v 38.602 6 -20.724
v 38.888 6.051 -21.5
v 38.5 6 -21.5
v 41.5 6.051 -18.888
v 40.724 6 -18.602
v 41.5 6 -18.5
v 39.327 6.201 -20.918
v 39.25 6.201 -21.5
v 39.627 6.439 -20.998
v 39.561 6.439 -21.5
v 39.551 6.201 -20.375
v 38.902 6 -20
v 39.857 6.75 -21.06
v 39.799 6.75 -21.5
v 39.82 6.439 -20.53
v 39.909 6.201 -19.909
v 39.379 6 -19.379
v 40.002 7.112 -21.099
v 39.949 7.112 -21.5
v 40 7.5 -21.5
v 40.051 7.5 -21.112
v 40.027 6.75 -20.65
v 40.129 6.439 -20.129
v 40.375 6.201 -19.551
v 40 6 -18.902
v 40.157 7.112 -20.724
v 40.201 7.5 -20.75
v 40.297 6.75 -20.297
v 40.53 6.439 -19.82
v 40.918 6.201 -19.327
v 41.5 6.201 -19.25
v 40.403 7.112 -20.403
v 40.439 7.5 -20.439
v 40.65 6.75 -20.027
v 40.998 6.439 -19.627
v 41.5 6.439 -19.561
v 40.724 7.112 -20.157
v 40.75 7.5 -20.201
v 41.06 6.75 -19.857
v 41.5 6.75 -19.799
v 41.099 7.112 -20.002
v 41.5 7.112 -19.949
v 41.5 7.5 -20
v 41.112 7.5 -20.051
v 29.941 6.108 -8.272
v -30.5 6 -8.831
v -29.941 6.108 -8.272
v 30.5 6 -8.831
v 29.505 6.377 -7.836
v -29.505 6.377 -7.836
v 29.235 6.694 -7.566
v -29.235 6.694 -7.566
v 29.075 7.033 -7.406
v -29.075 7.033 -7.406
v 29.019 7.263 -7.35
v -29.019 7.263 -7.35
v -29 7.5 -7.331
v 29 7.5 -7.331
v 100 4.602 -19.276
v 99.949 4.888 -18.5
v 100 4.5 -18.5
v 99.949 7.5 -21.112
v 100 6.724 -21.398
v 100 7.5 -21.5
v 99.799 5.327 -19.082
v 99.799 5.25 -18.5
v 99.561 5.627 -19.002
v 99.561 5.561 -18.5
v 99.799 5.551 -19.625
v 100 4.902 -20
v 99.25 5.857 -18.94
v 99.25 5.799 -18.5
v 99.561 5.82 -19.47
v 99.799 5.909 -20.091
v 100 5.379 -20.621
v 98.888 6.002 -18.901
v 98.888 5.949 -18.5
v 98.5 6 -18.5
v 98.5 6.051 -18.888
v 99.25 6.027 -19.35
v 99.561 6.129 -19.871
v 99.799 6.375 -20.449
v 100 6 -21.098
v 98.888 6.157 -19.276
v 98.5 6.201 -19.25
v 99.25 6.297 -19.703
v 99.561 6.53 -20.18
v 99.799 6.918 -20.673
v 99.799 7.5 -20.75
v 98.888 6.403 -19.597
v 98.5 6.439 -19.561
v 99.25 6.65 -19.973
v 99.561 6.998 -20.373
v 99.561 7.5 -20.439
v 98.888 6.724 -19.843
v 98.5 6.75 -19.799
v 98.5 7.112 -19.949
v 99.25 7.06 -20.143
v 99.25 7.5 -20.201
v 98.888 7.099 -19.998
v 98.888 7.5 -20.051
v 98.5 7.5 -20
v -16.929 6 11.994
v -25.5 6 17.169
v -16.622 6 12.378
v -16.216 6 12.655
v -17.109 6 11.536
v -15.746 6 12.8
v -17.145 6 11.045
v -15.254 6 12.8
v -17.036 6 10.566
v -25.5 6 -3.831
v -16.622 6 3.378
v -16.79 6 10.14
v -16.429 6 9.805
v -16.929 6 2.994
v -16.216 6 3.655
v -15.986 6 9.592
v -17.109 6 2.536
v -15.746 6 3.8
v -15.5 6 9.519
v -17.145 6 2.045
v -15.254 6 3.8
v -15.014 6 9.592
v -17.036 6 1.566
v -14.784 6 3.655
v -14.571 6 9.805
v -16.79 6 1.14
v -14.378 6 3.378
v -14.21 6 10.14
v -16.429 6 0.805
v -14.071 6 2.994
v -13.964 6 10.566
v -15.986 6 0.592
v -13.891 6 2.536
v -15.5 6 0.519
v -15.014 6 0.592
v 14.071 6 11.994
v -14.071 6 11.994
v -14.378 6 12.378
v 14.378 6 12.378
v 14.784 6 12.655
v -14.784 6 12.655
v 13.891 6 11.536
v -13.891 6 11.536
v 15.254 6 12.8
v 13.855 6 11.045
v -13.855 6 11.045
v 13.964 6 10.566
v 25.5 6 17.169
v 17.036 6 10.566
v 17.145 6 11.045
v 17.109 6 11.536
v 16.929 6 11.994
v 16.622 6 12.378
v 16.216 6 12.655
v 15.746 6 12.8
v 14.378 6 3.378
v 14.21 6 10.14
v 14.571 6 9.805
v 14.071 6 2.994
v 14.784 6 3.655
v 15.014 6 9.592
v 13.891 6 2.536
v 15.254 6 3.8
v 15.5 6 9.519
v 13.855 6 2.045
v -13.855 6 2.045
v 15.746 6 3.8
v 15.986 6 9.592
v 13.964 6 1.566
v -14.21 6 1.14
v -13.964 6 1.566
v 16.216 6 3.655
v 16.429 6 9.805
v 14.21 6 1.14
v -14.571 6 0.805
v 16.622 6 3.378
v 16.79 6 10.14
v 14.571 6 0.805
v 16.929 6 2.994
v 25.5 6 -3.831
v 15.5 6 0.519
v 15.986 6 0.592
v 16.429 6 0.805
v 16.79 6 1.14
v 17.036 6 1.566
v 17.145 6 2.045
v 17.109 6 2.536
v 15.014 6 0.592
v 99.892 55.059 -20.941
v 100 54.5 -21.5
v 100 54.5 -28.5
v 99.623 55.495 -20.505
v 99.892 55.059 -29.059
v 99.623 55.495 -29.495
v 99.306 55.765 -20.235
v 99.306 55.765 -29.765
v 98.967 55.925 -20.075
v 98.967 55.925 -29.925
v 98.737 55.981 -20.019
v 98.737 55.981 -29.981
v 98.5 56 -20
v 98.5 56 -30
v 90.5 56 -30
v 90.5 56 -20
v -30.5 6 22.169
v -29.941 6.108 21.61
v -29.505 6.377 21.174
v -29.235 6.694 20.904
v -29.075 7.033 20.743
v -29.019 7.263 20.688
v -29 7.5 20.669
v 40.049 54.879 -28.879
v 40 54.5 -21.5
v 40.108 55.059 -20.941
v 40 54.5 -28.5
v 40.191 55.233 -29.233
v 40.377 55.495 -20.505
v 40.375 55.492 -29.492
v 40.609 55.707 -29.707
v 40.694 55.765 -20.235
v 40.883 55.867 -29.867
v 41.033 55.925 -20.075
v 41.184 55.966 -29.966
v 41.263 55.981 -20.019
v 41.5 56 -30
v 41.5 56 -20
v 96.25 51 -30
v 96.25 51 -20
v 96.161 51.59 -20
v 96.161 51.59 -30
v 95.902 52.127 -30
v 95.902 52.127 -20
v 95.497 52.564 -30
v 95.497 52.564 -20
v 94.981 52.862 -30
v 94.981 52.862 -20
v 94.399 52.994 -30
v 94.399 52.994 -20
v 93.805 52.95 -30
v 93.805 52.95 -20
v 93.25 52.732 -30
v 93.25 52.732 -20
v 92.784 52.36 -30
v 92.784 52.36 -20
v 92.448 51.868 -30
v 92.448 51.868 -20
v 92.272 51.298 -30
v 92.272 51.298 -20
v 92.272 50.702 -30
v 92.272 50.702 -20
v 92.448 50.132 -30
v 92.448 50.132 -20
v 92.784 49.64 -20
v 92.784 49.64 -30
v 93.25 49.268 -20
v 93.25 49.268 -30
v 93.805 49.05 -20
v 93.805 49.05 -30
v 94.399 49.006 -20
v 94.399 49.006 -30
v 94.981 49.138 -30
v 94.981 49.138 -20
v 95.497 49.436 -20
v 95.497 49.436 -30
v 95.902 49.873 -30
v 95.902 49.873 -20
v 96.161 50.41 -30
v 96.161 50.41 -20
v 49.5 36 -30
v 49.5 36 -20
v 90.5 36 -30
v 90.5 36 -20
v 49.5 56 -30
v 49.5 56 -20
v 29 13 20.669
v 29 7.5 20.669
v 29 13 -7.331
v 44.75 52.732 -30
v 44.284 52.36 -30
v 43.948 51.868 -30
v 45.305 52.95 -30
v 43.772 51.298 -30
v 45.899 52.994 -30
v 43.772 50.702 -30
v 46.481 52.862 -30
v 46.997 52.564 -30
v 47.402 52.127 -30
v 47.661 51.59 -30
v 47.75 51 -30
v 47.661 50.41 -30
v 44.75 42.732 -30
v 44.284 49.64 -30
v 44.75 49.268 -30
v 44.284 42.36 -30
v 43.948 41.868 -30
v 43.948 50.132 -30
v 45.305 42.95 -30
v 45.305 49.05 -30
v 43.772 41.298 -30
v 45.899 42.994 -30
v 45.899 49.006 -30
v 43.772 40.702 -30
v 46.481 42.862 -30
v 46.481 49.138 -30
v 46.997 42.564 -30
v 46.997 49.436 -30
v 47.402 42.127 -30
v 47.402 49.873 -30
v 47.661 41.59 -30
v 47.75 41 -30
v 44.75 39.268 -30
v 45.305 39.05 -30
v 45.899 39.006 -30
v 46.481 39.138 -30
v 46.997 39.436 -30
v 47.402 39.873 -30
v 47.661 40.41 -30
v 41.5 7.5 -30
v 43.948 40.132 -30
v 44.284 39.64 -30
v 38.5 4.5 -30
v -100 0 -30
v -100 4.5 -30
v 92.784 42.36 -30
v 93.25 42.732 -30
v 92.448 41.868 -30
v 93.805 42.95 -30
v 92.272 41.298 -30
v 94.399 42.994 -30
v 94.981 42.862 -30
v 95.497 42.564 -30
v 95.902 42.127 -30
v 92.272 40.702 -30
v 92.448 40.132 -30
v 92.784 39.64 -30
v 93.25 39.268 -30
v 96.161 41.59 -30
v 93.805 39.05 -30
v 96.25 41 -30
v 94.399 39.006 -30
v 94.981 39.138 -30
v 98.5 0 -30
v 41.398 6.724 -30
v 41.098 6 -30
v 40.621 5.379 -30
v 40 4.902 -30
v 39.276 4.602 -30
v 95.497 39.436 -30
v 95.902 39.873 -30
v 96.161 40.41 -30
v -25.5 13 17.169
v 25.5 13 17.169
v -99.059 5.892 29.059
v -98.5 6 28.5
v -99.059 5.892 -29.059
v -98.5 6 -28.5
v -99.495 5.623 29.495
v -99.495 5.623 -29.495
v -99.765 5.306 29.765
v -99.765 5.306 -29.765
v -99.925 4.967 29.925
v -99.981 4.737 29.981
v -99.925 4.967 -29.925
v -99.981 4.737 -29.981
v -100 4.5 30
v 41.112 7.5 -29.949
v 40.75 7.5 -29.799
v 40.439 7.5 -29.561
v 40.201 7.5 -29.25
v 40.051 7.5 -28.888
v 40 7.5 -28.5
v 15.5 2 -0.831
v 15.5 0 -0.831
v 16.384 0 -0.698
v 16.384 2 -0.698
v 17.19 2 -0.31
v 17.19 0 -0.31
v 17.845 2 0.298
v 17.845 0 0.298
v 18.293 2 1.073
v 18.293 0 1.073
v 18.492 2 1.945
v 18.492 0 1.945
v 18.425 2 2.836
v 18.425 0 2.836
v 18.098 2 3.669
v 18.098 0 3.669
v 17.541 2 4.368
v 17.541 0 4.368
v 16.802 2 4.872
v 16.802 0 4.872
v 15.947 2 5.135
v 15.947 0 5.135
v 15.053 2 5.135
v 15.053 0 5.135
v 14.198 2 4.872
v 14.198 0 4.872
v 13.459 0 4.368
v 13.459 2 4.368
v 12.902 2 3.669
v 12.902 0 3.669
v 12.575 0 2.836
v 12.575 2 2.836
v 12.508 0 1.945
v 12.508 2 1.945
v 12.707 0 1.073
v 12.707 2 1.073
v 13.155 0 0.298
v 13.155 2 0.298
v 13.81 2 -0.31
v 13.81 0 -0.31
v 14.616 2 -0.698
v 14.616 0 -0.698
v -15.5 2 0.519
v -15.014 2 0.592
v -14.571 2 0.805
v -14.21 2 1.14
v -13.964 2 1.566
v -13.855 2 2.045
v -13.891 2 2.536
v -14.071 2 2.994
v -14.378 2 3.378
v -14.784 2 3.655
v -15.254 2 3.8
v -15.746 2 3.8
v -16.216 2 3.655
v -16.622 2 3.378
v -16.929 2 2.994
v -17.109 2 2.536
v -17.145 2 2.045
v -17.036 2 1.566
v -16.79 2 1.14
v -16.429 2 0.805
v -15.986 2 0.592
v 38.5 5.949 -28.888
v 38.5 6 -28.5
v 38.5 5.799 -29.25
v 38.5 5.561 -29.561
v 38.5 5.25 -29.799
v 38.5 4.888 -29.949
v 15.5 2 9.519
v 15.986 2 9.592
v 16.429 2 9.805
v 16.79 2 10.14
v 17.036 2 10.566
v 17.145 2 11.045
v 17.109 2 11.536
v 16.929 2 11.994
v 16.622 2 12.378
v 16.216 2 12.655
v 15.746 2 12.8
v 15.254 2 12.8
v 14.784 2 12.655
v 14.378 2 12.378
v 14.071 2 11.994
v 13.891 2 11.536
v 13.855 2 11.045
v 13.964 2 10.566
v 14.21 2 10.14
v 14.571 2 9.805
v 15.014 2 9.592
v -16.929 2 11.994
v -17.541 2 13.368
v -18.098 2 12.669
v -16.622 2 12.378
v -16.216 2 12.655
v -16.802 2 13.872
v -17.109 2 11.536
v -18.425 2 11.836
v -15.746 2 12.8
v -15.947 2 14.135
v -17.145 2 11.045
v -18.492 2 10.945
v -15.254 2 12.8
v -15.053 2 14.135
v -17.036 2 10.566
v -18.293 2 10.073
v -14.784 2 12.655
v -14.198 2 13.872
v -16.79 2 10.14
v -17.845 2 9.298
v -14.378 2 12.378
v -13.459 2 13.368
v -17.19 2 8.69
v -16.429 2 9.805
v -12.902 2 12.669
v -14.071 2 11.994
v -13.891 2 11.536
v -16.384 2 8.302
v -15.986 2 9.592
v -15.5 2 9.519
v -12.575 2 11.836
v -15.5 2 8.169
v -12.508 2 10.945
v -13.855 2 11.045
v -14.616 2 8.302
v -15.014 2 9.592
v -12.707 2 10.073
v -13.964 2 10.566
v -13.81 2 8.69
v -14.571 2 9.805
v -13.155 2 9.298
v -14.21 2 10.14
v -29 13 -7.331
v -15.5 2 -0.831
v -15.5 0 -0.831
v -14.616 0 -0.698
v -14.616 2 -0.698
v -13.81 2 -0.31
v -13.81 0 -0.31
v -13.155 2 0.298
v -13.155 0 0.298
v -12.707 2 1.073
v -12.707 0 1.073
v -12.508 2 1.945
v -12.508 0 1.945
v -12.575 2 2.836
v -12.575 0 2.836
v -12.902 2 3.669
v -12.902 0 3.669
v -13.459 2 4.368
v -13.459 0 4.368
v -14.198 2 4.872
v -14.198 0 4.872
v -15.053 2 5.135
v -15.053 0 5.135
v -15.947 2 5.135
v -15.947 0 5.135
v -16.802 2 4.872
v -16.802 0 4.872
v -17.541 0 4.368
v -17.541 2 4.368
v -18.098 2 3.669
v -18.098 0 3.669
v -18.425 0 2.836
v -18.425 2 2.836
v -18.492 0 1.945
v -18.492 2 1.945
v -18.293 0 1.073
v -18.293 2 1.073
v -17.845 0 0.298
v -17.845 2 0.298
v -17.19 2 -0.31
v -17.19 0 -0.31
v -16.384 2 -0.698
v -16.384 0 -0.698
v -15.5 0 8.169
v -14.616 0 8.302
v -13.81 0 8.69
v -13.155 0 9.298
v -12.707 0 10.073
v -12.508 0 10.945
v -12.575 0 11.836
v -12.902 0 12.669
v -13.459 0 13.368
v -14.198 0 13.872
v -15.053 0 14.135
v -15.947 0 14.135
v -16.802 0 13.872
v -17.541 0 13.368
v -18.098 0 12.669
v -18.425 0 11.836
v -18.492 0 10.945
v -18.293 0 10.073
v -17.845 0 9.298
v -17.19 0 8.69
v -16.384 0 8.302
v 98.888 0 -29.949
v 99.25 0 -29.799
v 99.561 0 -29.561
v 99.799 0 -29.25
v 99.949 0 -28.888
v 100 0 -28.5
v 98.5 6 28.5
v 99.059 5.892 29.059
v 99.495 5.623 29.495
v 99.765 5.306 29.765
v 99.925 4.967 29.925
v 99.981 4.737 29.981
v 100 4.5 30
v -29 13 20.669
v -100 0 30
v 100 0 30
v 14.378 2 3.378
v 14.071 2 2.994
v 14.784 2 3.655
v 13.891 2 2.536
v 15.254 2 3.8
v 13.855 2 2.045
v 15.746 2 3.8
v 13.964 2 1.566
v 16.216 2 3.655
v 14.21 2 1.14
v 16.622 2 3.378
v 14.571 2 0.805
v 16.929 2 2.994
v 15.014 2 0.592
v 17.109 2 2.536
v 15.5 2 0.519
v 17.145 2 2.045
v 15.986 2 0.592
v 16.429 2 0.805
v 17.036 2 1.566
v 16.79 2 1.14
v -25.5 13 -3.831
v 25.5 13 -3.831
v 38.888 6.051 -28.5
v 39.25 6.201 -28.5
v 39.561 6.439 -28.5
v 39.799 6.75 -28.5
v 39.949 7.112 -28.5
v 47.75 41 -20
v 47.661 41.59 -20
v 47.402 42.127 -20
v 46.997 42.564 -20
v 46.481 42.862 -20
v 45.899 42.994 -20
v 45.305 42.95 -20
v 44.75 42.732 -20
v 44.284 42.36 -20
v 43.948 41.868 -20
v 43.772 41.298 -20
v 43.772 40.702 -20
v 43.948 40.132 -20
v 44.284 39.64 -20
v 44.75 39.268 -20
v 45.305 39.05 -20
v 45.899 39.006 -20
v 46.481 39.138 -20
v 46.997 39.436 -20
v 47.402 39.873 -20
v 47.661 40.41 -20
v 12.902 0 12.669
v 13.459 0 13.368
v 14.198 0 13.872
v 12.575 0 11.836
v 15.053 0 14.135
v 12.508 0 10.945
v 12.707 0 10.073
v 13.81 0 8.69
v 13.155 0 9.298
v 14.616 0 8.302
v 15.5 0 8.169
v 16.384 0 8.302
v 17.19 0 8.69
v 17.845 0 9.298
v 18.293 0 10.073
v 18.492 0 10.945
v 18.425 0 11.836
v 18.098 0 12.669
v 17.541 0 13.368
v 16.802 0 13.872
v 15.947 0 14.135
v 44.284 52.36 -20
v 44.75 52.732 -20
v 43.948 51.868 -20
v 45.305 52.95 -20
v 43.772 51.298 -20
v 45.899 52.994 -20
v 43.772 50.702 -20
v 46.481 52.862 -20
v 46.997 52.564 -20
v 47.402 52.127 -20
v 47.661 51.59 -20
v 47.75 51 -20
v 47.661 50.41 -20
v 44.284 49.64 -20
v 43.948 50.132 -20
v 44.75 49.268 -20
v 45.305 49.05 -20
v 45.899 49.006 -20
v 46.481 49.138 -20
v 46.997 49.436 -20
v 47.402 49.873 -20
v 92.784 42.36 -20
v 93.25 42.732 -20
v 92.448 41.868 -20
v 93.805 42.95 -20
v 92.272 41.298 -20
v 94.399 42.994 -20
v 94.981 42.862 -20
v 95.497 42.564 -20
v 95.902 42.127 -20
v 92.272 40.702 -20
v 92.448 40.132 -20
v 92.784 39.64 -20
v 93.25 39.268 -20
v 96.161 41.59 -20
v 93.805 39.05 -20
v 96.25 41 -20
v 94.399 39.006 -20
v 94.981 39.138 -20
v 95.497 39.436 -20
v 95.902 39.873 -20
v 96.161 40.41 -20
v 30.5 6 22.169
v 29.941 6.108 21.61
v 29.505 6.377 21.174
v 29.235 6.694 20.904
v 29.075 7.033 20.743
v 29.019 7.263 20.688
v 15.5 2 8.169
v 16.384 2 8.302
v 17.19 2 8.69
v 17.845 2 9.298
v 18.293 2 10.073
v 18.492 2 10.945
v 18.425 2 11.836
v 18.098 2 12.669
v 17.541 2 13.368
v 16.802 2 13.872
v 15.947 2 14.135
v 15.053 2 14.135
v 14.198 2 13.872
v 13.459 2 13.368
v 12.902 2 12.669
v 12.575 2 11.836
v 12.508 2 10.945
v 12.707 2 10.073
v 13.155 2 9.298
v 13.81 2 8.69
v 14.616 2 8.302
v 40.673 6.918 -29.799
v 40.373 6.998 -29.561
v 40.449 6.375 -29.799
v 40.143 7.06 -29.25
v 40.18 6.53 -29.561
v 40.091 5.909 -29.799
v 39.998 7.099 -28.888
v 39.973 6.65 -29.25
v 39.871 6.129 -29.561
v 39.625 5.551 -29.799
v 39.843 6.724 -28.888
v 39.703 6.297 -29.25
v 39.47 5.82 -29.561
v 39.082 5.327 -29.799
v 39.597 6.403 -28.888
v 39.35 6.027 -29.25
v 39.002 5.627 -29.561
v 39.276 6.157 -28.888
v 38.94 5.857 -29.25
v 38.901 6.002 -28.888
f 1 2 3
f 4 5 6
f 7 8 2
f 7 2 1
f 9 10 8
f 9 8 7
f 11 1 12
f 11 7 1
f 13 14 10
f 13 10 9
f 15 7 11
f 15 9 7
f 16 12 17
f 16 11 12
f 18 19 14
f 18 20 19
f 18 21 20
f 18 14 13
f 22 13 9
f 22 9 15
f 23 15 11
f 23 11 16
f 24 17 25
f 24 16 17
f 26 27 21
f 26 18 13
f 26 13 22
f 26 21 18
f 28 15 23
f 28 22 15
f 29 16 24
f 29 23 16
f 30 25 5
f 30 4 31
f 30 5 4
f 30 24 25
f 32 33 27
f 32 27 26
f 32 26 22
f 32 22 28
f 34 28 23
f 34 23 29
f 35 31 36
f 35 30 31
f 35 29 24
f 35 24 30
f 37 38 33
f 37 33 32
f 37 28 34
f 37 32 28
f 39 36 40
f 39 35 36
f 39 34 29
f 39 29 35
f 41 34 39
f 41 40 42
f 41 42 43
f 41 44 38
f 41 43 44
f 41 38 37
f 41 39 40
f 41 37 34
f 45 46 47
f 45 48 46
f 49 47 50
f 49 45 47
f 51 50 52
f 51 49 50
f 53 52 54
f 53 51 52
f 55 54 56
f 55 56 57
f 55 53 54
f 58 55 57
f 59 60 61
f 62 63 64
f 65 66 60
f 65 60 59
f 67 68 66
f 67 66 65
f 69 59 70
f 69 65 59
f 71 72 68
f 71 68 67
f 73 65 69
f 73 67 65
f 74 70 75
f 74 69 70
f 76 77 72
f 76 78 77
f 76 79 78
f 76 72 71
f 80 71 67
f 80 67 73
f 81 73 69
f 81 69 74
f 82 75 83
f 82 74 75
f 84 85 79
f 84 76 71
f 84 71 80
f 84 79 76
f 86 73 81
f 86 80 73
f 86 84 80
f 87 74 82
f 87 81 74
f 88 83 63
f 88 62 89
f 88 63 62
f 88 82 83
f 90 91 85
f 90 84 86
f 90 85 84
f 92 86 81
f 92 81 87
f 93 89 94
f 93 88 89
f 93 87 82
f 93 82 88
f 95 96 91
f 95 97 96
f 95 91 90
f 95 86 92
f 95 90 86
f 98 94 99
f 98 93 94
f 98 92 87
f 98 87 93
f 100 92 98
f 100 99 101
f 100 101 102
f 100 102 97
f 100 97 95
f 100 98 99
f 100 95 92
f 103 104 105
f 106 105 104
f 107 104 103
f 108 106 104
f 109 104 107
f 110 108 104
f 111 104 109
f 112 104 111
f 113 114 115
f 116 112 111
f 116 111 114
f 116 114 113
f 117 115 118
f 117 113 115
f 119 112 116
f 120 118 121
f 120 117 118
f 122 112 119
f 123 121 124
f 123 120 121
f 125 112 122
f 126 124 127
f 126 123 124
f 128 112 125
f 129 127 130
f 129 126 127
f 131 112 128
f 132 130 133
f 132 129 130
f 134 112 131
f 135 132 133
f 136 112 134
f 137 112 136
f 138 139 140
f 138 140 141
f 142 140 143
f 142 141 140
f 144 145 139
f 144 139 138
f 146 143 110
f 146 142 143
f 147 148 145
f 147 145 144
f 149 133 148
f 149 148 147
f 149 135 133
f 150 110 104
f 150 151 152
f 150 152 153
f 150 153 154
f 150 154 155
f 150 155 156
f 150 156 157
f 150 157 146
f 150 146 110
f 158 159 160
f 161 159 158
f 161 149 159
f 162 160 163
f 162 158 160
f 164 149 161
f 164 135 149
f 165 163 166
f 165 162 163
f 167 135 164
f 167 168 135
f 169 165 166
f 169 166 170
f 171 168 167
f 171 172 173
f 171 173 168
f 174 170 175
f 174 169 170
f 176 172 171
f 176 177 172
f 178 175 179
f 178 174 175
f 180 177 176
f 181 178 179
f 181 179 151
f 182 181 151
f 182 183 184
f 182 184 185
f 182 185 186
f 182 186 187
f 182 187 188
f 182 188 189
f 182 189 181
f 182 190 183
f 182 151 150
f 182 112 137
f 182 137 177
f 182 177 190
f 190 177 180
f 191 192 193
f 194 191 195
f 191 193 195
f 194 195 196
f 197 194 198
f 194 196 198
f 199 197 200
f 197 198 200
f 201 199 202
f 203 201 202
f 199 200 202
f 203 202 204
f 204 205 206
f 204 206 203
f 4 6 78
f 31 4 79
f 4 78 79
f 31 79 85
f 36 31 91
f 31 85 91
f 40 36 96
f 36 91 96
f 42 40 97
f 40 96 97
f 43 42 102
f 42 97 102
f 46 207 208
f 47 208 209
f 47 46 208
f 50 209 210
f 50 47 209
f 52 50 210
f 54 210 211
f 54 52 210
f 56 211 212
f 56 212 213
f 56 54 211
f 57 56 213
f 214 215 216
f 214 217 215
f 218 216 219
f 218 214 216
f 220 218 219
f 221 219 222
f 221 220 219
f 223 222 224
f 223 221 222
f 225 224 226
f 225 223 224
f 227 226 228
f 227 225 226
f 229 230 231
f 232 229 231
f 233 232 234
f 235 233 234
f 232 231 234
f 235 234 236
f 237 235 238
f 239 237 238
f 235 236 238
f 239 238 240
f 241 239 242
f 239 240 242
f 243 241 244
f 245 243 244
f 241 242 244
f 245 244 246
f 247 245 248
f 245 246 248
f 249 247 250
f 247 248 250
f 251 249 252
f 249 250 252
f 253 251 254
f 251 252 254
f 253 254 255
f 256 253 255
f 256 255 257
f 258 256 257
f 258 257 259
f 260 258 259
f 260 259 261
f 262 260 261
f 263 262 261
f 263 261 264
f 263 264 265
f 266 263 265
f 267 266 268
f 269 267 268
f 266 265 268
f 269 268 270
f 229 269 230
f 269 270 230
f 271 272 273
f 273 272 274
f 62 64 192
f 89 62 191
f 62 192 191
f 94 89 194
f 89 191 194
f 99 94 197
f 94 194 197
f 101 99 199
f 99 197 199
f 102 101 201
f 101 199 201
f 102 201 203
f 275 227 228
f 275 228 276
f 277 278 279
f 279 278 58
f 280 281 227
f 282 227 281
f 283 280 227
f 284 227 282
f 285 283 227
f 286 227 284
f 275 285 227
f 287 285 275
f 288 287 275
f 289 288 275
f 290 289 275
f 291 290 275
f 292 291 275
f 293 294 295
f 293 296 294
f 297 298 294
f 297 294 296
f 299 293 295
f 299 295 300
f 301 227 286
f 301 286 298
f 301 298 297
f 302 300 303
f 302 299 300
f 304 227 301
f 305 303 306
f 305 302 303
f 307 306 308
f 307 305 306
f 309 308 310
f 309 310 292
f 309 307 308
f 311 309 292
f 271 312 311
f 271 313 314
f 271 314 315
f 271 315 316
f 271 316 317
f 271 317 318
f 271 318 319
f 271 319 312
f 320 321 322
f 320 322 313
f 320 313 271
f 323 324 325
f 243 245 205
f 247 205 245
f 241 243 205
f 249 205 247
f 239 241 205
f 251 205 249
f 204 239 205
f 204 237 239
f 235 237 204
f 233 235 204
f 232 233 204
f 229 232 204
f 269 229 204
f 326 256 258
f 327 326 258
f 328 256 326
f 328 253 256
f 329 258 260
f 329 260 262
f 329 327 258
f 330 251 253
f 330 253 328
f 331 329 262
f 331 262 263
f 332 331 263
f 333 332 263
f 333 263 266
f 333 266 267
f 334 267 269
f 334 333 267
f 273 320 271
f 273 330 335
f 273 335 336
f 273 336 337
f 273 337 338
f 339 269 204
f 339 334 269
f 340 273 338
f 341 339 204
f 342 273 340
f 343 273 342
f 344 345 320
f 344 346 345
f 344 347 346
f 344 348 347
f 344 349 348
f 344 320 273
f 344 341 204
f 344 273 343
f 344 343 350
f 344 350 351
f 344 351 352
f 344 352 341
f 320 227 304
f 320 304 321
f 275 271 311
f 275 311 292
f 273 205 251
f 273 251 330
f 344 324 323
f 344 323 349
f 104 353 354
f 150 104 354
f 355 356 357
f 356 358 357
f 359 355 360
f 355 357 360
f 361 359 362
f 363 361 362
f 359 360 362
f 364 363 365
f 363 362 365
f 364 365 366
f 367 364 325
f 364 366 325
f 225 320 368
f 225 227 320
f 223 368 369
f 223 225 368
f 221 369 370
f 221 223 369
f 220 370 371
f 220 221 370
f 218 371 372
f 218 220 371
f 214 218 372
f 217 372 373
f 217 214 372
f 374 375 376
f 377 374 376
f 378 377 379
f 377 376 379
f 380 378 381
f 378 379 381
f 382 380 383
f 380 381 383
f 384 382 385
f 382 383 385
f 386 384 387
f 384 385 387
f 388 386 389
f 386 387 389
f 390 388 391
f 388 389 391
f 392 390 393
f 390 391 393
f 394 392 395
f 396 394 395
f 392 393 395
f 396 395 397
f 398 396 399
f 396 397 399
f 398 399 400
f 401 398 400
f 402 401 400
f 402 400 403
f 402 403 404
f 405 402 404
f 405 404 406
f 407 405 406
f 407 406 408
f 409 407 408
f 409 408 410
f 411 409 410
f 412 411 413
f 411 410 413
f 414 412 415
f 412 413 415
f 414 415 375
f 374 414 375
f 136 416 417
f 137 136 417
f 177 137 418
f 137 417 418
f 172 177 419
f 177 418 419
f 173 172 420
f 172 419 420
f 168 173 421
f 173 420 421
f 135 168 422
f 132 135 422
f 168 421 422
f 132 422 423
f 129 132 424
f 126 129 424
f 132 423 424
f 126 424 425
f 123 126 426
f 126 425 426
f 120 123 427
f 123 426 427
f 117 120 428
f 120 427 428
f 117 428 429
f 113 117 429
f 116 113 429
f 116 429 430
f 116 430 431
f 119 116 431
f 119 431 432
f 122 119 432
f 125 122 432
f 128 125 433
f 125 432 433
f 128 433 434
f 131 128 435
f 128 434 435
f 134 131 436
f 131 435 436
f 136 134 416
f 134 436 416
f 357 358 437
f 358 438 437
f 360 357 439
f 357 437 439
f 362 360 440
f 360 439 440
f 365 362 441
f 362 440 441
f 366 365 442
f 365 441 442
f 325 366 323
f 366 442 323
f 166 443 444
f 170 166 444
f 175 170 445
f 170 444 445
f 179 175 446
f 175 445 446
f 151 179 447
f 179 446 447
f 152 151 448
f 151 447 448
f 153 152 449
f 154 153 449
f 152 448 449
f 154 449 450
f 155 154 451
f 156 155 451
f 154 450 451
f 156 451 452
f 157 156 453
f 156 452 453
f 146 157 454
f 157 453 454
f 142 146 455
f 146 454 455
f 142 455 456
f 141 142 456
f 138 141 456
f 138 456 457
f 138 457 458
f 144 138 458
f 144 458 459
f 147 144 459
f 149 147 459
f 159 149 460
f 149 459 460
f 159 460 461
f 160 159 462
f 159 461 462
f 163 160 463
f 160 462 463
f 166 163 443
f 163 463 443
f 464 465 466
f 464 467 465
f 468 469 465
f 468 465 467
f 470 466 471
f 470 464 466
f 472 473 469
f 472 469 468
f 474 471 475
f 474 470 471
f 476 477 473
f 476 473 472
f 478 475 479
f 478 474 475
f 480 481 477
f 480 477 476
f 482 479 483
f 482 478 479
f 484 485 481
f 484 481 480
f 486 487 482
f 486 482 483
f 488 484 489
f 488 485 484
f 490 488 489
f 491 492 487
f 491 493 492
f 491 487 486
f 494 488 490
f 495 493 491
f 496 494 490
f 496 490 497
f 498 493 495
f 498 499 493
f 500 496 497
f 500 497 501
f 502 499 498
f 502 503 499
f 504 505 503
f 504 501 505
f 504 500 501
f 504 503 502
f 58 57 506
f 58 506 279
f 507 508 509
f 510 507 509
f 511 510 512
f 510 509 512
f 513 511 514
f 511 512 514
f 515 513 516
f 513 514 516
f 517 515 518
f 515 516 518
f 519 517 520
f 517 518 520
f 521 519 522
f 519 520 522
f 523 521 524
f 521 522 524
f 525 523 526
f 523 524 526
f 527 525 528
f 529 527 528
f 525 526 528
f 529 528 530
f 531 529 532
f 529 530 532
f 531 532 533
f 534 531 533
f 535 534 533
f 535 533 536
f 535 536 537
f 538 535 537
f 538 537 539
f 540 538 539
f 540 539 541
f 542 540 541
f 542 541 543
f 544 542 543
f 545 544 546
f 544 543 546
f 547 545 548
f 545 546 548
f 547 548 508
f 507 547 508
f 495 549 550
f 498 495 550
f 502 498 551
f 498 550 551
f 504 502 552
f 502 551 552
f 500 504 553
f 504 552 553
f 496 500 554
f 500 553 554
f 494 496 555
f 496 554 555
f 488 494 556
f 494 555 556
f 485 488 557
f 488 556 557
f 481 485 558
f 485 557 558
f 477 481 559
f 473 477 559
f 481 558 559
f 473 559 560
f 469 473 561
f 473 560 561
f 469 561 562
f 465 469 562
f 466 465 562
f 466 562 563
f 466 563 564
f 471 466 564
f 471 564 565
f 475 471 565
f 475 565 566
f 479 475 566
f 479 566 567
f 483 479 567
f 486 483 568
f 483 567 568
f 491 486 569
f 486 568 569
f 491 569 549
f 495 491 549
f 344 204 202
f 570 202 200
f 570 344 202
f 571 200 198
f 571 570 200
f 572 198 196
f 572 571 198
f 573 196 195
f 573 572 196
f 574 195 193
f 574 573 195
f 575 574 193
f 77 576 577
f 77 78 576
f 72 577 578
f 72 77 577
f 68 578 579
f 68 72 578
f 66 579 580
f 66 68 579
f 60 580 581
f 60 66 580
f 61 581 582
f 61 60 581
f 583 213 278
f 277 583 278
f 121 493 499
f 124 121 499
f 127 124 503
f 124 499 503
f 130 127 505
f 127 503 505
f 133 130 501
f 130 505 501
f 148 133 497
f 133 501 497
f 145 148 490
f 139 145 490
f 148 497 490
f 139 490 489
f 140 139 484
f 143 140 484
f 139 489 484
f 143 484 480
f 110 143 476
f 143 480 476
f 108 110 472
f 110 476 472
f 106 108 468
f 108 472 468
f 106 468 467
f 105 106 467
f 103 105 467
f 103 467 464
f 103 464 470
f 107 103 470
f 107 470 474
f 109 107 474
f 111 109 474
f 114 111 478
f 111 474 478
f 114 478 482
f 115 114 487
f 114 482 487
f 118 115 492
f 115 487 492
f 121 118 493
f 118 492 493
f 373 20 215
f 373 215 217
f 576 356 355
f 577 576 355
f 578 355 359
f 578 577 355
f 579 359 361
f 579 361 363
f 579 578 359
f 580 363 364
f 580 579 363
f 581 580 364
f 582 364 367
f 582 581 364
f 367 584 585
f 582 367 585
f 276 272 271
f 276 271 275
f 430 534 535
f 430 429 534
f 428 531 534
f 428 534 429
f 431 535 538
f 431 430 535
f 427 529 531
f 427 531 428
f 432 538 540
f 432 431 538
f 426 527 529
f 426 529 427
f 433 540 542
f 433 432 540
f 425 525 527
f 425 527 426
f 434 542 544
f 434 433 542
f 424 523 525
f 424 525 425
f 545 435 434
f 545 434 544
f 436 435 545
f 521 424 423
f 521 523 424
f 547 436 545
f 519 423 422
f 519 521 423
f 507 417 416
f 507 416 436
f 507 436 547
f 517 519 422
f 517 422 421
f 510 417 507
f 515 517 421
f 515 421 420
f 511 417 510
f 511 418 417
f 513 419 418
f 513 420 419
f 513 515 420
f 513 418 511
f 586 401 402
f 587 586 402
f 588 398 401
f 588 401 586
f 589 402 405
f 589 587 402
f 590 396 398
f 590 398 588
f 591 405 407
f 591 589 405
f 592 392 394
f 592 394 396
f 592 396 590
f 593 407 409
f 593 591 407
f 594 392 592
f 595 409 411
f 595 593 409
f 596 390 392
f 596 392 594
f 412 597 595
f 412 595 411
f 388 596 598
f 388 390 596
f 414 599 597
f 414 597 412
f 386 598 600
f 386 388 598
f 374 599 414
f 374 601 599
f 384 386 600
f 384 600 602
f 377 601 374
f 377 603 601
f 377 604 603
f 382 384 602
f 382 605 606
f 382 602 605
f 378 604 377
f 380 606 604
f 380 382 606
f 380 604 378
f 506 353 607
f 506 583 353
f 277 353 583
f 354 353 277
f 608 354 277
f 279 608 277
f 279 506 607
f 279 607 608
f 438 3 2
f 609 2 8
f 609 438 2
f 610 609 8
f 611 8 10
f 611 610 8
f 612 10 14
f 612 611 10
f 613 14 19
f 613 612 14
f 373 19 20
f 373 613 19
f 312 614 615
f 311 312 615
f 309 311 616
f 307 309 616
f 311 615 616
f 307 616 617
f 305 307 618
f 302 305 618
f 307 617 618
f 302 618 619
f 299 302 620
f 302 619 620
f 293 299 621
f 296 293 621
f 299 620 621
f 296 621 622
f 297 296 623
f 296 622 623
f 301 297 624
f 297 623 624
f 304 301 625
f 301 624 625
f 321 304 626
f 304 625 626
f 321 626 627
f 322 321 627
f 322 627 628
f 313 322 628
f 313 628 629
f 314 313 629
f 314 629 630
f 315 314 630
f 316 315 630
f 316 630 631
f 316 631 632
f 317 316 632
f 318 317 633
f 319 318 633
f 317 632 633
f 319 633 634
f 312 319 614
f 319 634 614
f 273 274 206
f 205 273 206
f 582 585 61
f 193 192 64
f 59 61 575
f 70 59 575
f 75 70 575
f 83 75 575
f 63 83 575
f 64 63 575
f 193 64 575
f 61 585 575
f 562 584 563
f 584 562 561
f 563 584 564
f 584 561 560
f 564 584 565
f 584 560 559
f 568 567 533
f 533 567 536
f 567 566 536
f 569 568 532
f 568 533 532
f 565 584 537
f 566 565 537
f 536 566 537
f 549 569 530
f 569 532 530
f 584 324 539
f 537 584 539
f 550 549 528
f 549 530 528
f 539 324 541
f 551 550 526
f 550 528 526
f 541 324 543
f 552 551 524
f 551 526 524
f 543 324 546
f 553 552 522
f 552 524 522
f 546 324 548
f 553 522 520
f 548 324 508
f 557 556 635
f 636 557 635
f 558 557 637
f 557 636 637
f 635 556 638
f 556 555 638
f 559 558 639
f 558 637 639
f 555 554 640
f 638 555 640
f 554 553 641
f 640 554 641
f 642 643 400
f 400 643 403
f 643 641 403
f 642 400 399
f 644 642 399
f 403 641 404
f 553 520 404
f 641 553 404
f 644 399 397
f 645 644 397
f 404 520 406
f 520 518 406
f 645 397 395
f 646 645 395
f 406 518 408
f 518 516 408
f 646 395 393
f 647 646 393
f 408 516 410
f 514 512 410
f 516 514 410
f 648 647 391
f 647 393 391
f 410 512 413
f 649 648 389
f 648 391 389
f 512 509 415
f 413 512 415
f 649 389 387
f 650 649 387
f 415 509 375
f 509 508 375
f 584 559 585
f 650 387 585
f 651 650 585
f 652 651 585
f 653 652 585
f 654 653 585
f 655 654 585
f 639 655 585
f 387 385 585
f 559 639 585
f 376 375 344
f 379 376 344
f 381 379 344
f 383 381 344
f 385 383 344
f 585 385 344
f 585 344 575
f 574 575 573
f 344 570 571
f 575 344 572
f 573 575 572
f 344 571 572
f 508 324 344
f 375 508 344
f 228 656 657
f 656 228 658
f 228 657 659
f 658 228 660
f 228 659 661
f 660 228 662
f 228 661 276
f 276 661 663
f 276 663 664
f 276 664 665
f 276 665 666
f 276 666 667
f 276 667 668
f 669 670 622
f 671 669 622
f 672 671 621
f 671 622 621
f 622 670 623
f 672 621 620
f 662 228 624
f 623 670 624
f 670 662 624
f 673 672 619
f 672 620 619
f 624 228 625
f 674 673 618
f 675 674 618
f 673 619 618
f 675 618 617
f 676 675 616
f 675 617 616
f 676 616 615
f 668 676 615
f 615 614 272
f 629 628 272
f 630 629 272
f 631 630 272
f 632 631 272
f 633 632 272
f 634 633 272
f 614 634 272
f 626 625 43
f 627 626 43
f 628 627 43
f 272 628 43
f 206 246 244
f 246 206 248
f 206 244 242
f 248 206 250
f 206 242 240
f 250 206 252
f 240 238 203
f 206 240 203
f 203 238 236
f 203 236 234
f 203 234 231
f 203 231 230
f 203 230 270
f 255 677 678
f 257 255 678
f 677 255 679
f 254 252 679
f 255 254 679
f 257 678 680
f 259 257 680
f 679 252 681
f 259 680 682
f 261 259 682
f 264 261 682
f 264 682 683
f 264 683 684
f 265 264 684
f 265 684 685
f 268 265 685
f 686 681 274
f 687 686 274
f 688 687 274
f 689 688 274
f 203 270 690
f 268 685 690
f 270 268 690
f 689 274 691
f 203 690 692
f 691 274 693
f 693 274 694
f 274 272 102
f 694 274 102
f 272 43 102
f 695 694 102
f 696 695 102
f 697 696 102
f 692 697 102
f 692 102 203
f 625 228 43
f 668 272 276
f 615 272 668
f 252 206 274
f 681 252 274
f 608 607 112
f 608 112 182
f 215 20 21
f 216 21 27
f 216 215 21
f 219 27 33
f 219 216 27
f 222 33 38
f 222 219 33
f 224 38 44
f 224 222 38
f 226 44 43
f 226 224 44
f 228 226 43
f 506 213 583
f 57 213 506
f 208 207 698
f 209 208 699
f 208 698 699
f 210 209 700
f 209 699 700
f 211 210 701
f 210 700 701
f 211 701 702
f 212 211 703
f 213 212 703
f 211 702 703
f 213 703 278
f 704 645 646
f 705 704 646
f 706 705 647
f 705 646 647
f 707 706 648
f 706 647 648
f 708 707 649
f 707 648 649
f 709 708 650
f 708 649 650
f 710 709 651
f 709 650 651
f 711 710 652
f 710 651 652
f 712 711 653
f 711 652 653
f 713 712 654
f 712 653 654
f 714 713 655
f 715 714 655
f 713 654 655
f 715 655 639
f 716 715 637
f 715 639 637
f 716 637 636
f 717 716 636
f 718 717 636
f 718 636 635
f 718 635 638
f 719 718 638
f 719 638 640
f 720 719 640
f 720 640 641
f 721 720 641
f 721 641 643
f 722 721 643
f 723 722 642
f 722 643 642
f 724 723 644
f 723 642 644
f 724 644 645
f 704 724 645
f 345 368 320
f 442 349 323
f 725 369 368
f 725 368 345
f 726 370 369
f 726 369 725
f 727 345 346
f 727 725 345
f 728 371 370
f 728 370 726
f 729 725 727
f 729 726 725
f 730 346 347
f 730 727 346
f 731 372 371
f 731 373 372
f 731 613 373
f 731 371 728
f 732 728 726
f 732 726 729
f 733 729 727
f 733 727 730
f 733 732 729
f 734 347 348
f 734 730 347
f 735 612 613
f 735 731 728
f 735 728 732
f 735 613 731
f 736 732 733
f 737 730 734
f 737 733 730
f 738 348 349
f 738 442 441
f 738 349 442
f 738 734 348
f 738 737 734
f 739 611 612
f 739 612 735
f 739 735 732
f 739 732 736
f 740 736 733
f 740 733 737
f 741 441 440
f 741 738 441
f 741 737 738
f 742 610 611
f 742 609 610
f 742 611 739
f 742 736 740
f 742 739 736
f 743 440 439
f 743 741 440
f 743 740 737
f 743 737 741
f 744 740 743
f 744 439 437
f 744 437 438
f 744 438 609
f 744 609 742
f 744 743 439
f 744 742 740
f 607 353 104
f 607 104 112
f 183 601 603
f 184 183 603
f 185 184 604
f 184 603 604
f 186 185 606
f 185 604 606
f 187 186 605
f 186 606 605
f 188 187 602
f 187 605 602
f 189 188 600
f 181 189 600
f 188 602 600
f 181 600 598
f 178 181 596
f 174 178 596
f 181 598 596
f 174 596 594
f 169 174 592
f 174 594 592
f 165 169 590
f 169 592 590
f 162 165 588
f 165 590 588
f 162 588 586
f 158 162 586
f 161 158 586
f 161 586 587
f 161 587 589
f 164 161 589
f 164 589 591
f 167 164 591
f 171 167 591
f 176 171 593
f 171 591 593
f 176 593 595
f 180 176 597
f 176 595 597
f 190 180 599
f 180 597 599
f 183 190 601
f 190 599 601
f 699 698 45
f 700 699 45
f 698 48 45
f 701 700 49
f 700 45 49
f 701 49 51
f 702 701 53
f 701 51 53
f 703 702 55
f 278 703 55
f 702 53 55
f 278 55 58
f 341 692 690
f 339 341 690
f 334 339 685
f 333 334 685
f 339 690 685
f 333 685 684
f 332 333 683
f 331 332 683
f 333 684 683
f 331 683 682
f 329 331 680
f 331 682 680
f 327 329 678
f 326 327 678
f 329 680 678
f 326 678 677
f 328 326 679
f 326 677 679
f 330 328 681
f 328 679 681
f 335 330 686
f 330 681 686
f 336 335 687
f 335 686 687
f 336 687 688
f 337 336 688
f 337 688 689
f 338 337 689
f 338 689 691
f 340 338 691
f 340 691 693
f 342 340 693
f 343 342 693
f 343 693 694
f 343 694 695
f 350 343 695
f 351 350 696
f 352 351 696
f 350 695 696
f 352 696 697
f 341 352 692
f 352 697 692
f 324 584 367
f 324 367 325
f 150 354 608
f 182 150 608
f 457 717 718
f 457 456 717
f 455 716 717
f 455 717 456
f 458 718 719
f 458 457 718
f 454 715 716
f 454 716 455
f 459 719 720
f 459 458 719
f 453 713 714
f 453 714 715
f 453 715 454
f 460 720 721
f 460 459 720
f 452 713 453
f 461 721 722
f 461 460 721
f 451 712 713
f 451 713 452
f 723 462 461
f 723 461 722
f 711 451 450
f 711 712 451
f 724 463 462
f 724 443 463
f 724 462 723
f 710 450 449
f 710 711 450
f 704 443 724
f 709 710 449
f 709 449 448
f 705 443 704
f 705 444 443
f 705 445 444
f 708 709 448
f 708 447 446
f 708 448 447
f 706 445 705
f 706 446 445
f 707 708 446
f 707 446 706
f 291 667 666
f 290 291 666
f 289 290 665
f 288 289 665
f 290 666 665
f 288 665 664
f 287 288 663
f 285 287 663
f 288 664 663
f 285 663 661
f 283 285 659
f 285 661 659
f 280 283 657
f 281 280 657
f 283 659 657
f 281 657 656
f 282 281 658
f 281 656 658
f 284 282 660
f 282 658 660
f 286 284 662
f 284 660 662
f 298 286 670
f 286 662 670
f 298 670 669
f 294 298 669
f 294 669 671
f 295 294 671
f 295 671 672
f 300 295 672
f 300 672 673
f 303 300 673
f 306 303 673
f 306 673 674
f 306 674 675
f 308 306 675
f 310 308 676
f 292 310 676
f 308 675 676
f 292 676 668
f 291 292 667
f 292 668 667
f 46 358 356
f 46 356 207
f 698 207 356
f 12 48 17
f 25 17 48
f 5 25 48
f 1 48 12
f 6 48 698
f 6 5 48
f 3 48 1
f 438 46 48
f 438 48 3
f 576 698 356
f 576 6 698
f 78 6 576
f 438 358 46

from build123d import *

# Parameters (mm, degrees)
SKETCH8_W           = 200
SKETCH8_H           = 60
BOSS_EXTRUDE6_DEPTH = 6
SKETCH9_W           = 60
SKETCH9_H           = 10
BOSS_EXTRUDE7_DEPTH = 50
SKETCH10_R          = 2
SKETCH10_W          = 41
SKETCH10_H          = 20
CUT_EXTRUDE8_DEPTH  = 10
SKETCH15_W          = 58
SKETCH15_H          = 28
BOSS_EXTRUDE9_DEPTH = 7
SKETCH12_W          = 51
SKETCH12_H          = 21
CUT_EXTRUDE9_DEPTH  = 7
SKETCH13_R          = 3
CUT_EXTRUDE10_DEPTH = 2
SKETCH17_R          = 1.65
CUT_EXTRUDE11_DEPTH = 4
FILLET1_R           = 1.5
FILLET2_R           = 1.5


with BuildPart() as part:
    # Sketch8 → Boss-Extrude6 (new body)
    with BuildSketch(Plane(origin=(0, 0, 0), x_dir=(1, 0, 0), z_dir=(0, 1, 0))):
        Rectangle(SKETCH8_W, SKETCH8_H)
    extrude(amount=BOSS_EXTRUDE6_DEPTH)

    # Sketch9 → Boss-Extrude7 (add)
    with BuildSketch(Plane(origin=(0, 6, 0), x_dir=(1, 0, 0), z_dir=(0, 1, 0))):
        with Locations((70, 25)):
            Rectangle(SKETCH9_W, SKETCH9_H)
    extrude(amount=BOSS_EXTRUDE7_DEPTH)

    # Sketch10 → Cut-Extrude8 (cut)
    with BuildSketch(Plane.XY.offset(-20)):
        with Locations((45.75, 51)):
            Circle(SKETCH10_R)
        with Locations((45.75, 41)):
            Circle(SKETCH10_R)
        with Locations((70, 46)):
            Rectangle(SKETCH10_W, SKETCH10_H)
        with Locations((94.25, 51)):
            Circle(SKETCH10_R)
        with Locations((94.25, 41)):
            Circle(SKETCH10_R)
    extrude(amount=-CUT_EXTRUDE8_DEPTH, mode=Mode.SUBTRACT)

    # Sketch15 → Boss-Extrude9 (add)
    with BuildSketch(Plane(origin=(0, 6, 0), x_dir=(1, 0, 0), z_dir=(0, 1, 0))):
        with Locations((0, -6.66875)):
            Rectangle(SKETCH15_W, SKETCH15_H)
    extrude(amount=BOSS_EXTRUDE9_DEPTH)

    # Sketch12 → Cut-Extrude9 (cut)
    with BuildSketch(Plane(origin=(0, 13, 0), x_dir=(1, 0, 0), z_dir=(0, 1, 0))):
        with Locations((0, -6.66875)):
            Rectangle(SKETCH12_W, SKETCH12_H)
    extrude(amount=-CUT_EXTRUDE9_DEPTH, mode=Mode.SUBTRACT)

    # Sketch13 → Cut-Extrude10 (cut)
    with BuildSketch(Plane(origin=(0, 0, 0), x_dir=(-1, 0, 0), z_dir=(0, -1, 0))):
        with Locations(Location((-15.5, -2.16875, 0), (0, 0, 90))):
            Circle(SKETCH13_R)
        with Locations(Location((-15.5, -11.16875, 0), (0, 0, 90))):
            Circle(SKETCH13_R)
        with Locations(Location((15.5, -2.16875, 0), (0, 0, 90))):
            Circle(SKETCH13_R)
        with Locations(Location((15.5, -11.16875, 0), (0, 0, 90))):
            Circle(SKETCH13_R)
    extrude(amount=-CUT_EXTRUDE10_DEPTH, mode=Mode.SUBTRACT)

    # Sketch17 → Cut-Extrude11 (cut)
    with BuildSketch(Plane.XZ.offset(-2)):
        with Locations(Location((-15.5, 11.16875, 0), (0, 0, 270))):
            Circle(SKETCH17_R)
        with Locations(Location((-15.5, 2.16875, 0), (0, 0, 270))):
            Circle(SKETCH17_R)
        with Locations(Location((15.5, 11.16875, 0), (0, 0, 270))):
            Circle(SKETCH17_R)
        with Locations(Location((15.5, 2.16875, 0), (0, 0, 270))):
            Circle(SKETCH17_R)
    extrude(amount=-CUT_EXTRUDE11_DEPTH, mode=Mode.SUBTRACT)

    # Fillet1
    fillet1_edges = [part.edges().sort_by_distance(p)[0] for p in [
        (-29, 6, 6.66875),
        (0, 6, 20.66875),
        (29, 6, 6.66875),
        (0, 6, -7.33125),
    ]]
    fillet(fillet1_edges, radius=FILLET1_R)

    # Fillet2
    fillet2_edges = [part.edges().sort_by_distance(p)[0] for p in [
        (-100, 6, 0),
        (-30, 6, -30),
        (0, 6, 30),
        (100, 31, -20),
        (40, 6, -25),
        (40, 31, -30),
        (70, 6, -20),
        (40, 31, -20),
        (100, 56, -25),
        (40, 56, -25),
        (100, 6, 5),
        (100, 28, -30),
    ]]
    fillet(fillet2_edges, radius=FILLET2_R)


solid = part.part
